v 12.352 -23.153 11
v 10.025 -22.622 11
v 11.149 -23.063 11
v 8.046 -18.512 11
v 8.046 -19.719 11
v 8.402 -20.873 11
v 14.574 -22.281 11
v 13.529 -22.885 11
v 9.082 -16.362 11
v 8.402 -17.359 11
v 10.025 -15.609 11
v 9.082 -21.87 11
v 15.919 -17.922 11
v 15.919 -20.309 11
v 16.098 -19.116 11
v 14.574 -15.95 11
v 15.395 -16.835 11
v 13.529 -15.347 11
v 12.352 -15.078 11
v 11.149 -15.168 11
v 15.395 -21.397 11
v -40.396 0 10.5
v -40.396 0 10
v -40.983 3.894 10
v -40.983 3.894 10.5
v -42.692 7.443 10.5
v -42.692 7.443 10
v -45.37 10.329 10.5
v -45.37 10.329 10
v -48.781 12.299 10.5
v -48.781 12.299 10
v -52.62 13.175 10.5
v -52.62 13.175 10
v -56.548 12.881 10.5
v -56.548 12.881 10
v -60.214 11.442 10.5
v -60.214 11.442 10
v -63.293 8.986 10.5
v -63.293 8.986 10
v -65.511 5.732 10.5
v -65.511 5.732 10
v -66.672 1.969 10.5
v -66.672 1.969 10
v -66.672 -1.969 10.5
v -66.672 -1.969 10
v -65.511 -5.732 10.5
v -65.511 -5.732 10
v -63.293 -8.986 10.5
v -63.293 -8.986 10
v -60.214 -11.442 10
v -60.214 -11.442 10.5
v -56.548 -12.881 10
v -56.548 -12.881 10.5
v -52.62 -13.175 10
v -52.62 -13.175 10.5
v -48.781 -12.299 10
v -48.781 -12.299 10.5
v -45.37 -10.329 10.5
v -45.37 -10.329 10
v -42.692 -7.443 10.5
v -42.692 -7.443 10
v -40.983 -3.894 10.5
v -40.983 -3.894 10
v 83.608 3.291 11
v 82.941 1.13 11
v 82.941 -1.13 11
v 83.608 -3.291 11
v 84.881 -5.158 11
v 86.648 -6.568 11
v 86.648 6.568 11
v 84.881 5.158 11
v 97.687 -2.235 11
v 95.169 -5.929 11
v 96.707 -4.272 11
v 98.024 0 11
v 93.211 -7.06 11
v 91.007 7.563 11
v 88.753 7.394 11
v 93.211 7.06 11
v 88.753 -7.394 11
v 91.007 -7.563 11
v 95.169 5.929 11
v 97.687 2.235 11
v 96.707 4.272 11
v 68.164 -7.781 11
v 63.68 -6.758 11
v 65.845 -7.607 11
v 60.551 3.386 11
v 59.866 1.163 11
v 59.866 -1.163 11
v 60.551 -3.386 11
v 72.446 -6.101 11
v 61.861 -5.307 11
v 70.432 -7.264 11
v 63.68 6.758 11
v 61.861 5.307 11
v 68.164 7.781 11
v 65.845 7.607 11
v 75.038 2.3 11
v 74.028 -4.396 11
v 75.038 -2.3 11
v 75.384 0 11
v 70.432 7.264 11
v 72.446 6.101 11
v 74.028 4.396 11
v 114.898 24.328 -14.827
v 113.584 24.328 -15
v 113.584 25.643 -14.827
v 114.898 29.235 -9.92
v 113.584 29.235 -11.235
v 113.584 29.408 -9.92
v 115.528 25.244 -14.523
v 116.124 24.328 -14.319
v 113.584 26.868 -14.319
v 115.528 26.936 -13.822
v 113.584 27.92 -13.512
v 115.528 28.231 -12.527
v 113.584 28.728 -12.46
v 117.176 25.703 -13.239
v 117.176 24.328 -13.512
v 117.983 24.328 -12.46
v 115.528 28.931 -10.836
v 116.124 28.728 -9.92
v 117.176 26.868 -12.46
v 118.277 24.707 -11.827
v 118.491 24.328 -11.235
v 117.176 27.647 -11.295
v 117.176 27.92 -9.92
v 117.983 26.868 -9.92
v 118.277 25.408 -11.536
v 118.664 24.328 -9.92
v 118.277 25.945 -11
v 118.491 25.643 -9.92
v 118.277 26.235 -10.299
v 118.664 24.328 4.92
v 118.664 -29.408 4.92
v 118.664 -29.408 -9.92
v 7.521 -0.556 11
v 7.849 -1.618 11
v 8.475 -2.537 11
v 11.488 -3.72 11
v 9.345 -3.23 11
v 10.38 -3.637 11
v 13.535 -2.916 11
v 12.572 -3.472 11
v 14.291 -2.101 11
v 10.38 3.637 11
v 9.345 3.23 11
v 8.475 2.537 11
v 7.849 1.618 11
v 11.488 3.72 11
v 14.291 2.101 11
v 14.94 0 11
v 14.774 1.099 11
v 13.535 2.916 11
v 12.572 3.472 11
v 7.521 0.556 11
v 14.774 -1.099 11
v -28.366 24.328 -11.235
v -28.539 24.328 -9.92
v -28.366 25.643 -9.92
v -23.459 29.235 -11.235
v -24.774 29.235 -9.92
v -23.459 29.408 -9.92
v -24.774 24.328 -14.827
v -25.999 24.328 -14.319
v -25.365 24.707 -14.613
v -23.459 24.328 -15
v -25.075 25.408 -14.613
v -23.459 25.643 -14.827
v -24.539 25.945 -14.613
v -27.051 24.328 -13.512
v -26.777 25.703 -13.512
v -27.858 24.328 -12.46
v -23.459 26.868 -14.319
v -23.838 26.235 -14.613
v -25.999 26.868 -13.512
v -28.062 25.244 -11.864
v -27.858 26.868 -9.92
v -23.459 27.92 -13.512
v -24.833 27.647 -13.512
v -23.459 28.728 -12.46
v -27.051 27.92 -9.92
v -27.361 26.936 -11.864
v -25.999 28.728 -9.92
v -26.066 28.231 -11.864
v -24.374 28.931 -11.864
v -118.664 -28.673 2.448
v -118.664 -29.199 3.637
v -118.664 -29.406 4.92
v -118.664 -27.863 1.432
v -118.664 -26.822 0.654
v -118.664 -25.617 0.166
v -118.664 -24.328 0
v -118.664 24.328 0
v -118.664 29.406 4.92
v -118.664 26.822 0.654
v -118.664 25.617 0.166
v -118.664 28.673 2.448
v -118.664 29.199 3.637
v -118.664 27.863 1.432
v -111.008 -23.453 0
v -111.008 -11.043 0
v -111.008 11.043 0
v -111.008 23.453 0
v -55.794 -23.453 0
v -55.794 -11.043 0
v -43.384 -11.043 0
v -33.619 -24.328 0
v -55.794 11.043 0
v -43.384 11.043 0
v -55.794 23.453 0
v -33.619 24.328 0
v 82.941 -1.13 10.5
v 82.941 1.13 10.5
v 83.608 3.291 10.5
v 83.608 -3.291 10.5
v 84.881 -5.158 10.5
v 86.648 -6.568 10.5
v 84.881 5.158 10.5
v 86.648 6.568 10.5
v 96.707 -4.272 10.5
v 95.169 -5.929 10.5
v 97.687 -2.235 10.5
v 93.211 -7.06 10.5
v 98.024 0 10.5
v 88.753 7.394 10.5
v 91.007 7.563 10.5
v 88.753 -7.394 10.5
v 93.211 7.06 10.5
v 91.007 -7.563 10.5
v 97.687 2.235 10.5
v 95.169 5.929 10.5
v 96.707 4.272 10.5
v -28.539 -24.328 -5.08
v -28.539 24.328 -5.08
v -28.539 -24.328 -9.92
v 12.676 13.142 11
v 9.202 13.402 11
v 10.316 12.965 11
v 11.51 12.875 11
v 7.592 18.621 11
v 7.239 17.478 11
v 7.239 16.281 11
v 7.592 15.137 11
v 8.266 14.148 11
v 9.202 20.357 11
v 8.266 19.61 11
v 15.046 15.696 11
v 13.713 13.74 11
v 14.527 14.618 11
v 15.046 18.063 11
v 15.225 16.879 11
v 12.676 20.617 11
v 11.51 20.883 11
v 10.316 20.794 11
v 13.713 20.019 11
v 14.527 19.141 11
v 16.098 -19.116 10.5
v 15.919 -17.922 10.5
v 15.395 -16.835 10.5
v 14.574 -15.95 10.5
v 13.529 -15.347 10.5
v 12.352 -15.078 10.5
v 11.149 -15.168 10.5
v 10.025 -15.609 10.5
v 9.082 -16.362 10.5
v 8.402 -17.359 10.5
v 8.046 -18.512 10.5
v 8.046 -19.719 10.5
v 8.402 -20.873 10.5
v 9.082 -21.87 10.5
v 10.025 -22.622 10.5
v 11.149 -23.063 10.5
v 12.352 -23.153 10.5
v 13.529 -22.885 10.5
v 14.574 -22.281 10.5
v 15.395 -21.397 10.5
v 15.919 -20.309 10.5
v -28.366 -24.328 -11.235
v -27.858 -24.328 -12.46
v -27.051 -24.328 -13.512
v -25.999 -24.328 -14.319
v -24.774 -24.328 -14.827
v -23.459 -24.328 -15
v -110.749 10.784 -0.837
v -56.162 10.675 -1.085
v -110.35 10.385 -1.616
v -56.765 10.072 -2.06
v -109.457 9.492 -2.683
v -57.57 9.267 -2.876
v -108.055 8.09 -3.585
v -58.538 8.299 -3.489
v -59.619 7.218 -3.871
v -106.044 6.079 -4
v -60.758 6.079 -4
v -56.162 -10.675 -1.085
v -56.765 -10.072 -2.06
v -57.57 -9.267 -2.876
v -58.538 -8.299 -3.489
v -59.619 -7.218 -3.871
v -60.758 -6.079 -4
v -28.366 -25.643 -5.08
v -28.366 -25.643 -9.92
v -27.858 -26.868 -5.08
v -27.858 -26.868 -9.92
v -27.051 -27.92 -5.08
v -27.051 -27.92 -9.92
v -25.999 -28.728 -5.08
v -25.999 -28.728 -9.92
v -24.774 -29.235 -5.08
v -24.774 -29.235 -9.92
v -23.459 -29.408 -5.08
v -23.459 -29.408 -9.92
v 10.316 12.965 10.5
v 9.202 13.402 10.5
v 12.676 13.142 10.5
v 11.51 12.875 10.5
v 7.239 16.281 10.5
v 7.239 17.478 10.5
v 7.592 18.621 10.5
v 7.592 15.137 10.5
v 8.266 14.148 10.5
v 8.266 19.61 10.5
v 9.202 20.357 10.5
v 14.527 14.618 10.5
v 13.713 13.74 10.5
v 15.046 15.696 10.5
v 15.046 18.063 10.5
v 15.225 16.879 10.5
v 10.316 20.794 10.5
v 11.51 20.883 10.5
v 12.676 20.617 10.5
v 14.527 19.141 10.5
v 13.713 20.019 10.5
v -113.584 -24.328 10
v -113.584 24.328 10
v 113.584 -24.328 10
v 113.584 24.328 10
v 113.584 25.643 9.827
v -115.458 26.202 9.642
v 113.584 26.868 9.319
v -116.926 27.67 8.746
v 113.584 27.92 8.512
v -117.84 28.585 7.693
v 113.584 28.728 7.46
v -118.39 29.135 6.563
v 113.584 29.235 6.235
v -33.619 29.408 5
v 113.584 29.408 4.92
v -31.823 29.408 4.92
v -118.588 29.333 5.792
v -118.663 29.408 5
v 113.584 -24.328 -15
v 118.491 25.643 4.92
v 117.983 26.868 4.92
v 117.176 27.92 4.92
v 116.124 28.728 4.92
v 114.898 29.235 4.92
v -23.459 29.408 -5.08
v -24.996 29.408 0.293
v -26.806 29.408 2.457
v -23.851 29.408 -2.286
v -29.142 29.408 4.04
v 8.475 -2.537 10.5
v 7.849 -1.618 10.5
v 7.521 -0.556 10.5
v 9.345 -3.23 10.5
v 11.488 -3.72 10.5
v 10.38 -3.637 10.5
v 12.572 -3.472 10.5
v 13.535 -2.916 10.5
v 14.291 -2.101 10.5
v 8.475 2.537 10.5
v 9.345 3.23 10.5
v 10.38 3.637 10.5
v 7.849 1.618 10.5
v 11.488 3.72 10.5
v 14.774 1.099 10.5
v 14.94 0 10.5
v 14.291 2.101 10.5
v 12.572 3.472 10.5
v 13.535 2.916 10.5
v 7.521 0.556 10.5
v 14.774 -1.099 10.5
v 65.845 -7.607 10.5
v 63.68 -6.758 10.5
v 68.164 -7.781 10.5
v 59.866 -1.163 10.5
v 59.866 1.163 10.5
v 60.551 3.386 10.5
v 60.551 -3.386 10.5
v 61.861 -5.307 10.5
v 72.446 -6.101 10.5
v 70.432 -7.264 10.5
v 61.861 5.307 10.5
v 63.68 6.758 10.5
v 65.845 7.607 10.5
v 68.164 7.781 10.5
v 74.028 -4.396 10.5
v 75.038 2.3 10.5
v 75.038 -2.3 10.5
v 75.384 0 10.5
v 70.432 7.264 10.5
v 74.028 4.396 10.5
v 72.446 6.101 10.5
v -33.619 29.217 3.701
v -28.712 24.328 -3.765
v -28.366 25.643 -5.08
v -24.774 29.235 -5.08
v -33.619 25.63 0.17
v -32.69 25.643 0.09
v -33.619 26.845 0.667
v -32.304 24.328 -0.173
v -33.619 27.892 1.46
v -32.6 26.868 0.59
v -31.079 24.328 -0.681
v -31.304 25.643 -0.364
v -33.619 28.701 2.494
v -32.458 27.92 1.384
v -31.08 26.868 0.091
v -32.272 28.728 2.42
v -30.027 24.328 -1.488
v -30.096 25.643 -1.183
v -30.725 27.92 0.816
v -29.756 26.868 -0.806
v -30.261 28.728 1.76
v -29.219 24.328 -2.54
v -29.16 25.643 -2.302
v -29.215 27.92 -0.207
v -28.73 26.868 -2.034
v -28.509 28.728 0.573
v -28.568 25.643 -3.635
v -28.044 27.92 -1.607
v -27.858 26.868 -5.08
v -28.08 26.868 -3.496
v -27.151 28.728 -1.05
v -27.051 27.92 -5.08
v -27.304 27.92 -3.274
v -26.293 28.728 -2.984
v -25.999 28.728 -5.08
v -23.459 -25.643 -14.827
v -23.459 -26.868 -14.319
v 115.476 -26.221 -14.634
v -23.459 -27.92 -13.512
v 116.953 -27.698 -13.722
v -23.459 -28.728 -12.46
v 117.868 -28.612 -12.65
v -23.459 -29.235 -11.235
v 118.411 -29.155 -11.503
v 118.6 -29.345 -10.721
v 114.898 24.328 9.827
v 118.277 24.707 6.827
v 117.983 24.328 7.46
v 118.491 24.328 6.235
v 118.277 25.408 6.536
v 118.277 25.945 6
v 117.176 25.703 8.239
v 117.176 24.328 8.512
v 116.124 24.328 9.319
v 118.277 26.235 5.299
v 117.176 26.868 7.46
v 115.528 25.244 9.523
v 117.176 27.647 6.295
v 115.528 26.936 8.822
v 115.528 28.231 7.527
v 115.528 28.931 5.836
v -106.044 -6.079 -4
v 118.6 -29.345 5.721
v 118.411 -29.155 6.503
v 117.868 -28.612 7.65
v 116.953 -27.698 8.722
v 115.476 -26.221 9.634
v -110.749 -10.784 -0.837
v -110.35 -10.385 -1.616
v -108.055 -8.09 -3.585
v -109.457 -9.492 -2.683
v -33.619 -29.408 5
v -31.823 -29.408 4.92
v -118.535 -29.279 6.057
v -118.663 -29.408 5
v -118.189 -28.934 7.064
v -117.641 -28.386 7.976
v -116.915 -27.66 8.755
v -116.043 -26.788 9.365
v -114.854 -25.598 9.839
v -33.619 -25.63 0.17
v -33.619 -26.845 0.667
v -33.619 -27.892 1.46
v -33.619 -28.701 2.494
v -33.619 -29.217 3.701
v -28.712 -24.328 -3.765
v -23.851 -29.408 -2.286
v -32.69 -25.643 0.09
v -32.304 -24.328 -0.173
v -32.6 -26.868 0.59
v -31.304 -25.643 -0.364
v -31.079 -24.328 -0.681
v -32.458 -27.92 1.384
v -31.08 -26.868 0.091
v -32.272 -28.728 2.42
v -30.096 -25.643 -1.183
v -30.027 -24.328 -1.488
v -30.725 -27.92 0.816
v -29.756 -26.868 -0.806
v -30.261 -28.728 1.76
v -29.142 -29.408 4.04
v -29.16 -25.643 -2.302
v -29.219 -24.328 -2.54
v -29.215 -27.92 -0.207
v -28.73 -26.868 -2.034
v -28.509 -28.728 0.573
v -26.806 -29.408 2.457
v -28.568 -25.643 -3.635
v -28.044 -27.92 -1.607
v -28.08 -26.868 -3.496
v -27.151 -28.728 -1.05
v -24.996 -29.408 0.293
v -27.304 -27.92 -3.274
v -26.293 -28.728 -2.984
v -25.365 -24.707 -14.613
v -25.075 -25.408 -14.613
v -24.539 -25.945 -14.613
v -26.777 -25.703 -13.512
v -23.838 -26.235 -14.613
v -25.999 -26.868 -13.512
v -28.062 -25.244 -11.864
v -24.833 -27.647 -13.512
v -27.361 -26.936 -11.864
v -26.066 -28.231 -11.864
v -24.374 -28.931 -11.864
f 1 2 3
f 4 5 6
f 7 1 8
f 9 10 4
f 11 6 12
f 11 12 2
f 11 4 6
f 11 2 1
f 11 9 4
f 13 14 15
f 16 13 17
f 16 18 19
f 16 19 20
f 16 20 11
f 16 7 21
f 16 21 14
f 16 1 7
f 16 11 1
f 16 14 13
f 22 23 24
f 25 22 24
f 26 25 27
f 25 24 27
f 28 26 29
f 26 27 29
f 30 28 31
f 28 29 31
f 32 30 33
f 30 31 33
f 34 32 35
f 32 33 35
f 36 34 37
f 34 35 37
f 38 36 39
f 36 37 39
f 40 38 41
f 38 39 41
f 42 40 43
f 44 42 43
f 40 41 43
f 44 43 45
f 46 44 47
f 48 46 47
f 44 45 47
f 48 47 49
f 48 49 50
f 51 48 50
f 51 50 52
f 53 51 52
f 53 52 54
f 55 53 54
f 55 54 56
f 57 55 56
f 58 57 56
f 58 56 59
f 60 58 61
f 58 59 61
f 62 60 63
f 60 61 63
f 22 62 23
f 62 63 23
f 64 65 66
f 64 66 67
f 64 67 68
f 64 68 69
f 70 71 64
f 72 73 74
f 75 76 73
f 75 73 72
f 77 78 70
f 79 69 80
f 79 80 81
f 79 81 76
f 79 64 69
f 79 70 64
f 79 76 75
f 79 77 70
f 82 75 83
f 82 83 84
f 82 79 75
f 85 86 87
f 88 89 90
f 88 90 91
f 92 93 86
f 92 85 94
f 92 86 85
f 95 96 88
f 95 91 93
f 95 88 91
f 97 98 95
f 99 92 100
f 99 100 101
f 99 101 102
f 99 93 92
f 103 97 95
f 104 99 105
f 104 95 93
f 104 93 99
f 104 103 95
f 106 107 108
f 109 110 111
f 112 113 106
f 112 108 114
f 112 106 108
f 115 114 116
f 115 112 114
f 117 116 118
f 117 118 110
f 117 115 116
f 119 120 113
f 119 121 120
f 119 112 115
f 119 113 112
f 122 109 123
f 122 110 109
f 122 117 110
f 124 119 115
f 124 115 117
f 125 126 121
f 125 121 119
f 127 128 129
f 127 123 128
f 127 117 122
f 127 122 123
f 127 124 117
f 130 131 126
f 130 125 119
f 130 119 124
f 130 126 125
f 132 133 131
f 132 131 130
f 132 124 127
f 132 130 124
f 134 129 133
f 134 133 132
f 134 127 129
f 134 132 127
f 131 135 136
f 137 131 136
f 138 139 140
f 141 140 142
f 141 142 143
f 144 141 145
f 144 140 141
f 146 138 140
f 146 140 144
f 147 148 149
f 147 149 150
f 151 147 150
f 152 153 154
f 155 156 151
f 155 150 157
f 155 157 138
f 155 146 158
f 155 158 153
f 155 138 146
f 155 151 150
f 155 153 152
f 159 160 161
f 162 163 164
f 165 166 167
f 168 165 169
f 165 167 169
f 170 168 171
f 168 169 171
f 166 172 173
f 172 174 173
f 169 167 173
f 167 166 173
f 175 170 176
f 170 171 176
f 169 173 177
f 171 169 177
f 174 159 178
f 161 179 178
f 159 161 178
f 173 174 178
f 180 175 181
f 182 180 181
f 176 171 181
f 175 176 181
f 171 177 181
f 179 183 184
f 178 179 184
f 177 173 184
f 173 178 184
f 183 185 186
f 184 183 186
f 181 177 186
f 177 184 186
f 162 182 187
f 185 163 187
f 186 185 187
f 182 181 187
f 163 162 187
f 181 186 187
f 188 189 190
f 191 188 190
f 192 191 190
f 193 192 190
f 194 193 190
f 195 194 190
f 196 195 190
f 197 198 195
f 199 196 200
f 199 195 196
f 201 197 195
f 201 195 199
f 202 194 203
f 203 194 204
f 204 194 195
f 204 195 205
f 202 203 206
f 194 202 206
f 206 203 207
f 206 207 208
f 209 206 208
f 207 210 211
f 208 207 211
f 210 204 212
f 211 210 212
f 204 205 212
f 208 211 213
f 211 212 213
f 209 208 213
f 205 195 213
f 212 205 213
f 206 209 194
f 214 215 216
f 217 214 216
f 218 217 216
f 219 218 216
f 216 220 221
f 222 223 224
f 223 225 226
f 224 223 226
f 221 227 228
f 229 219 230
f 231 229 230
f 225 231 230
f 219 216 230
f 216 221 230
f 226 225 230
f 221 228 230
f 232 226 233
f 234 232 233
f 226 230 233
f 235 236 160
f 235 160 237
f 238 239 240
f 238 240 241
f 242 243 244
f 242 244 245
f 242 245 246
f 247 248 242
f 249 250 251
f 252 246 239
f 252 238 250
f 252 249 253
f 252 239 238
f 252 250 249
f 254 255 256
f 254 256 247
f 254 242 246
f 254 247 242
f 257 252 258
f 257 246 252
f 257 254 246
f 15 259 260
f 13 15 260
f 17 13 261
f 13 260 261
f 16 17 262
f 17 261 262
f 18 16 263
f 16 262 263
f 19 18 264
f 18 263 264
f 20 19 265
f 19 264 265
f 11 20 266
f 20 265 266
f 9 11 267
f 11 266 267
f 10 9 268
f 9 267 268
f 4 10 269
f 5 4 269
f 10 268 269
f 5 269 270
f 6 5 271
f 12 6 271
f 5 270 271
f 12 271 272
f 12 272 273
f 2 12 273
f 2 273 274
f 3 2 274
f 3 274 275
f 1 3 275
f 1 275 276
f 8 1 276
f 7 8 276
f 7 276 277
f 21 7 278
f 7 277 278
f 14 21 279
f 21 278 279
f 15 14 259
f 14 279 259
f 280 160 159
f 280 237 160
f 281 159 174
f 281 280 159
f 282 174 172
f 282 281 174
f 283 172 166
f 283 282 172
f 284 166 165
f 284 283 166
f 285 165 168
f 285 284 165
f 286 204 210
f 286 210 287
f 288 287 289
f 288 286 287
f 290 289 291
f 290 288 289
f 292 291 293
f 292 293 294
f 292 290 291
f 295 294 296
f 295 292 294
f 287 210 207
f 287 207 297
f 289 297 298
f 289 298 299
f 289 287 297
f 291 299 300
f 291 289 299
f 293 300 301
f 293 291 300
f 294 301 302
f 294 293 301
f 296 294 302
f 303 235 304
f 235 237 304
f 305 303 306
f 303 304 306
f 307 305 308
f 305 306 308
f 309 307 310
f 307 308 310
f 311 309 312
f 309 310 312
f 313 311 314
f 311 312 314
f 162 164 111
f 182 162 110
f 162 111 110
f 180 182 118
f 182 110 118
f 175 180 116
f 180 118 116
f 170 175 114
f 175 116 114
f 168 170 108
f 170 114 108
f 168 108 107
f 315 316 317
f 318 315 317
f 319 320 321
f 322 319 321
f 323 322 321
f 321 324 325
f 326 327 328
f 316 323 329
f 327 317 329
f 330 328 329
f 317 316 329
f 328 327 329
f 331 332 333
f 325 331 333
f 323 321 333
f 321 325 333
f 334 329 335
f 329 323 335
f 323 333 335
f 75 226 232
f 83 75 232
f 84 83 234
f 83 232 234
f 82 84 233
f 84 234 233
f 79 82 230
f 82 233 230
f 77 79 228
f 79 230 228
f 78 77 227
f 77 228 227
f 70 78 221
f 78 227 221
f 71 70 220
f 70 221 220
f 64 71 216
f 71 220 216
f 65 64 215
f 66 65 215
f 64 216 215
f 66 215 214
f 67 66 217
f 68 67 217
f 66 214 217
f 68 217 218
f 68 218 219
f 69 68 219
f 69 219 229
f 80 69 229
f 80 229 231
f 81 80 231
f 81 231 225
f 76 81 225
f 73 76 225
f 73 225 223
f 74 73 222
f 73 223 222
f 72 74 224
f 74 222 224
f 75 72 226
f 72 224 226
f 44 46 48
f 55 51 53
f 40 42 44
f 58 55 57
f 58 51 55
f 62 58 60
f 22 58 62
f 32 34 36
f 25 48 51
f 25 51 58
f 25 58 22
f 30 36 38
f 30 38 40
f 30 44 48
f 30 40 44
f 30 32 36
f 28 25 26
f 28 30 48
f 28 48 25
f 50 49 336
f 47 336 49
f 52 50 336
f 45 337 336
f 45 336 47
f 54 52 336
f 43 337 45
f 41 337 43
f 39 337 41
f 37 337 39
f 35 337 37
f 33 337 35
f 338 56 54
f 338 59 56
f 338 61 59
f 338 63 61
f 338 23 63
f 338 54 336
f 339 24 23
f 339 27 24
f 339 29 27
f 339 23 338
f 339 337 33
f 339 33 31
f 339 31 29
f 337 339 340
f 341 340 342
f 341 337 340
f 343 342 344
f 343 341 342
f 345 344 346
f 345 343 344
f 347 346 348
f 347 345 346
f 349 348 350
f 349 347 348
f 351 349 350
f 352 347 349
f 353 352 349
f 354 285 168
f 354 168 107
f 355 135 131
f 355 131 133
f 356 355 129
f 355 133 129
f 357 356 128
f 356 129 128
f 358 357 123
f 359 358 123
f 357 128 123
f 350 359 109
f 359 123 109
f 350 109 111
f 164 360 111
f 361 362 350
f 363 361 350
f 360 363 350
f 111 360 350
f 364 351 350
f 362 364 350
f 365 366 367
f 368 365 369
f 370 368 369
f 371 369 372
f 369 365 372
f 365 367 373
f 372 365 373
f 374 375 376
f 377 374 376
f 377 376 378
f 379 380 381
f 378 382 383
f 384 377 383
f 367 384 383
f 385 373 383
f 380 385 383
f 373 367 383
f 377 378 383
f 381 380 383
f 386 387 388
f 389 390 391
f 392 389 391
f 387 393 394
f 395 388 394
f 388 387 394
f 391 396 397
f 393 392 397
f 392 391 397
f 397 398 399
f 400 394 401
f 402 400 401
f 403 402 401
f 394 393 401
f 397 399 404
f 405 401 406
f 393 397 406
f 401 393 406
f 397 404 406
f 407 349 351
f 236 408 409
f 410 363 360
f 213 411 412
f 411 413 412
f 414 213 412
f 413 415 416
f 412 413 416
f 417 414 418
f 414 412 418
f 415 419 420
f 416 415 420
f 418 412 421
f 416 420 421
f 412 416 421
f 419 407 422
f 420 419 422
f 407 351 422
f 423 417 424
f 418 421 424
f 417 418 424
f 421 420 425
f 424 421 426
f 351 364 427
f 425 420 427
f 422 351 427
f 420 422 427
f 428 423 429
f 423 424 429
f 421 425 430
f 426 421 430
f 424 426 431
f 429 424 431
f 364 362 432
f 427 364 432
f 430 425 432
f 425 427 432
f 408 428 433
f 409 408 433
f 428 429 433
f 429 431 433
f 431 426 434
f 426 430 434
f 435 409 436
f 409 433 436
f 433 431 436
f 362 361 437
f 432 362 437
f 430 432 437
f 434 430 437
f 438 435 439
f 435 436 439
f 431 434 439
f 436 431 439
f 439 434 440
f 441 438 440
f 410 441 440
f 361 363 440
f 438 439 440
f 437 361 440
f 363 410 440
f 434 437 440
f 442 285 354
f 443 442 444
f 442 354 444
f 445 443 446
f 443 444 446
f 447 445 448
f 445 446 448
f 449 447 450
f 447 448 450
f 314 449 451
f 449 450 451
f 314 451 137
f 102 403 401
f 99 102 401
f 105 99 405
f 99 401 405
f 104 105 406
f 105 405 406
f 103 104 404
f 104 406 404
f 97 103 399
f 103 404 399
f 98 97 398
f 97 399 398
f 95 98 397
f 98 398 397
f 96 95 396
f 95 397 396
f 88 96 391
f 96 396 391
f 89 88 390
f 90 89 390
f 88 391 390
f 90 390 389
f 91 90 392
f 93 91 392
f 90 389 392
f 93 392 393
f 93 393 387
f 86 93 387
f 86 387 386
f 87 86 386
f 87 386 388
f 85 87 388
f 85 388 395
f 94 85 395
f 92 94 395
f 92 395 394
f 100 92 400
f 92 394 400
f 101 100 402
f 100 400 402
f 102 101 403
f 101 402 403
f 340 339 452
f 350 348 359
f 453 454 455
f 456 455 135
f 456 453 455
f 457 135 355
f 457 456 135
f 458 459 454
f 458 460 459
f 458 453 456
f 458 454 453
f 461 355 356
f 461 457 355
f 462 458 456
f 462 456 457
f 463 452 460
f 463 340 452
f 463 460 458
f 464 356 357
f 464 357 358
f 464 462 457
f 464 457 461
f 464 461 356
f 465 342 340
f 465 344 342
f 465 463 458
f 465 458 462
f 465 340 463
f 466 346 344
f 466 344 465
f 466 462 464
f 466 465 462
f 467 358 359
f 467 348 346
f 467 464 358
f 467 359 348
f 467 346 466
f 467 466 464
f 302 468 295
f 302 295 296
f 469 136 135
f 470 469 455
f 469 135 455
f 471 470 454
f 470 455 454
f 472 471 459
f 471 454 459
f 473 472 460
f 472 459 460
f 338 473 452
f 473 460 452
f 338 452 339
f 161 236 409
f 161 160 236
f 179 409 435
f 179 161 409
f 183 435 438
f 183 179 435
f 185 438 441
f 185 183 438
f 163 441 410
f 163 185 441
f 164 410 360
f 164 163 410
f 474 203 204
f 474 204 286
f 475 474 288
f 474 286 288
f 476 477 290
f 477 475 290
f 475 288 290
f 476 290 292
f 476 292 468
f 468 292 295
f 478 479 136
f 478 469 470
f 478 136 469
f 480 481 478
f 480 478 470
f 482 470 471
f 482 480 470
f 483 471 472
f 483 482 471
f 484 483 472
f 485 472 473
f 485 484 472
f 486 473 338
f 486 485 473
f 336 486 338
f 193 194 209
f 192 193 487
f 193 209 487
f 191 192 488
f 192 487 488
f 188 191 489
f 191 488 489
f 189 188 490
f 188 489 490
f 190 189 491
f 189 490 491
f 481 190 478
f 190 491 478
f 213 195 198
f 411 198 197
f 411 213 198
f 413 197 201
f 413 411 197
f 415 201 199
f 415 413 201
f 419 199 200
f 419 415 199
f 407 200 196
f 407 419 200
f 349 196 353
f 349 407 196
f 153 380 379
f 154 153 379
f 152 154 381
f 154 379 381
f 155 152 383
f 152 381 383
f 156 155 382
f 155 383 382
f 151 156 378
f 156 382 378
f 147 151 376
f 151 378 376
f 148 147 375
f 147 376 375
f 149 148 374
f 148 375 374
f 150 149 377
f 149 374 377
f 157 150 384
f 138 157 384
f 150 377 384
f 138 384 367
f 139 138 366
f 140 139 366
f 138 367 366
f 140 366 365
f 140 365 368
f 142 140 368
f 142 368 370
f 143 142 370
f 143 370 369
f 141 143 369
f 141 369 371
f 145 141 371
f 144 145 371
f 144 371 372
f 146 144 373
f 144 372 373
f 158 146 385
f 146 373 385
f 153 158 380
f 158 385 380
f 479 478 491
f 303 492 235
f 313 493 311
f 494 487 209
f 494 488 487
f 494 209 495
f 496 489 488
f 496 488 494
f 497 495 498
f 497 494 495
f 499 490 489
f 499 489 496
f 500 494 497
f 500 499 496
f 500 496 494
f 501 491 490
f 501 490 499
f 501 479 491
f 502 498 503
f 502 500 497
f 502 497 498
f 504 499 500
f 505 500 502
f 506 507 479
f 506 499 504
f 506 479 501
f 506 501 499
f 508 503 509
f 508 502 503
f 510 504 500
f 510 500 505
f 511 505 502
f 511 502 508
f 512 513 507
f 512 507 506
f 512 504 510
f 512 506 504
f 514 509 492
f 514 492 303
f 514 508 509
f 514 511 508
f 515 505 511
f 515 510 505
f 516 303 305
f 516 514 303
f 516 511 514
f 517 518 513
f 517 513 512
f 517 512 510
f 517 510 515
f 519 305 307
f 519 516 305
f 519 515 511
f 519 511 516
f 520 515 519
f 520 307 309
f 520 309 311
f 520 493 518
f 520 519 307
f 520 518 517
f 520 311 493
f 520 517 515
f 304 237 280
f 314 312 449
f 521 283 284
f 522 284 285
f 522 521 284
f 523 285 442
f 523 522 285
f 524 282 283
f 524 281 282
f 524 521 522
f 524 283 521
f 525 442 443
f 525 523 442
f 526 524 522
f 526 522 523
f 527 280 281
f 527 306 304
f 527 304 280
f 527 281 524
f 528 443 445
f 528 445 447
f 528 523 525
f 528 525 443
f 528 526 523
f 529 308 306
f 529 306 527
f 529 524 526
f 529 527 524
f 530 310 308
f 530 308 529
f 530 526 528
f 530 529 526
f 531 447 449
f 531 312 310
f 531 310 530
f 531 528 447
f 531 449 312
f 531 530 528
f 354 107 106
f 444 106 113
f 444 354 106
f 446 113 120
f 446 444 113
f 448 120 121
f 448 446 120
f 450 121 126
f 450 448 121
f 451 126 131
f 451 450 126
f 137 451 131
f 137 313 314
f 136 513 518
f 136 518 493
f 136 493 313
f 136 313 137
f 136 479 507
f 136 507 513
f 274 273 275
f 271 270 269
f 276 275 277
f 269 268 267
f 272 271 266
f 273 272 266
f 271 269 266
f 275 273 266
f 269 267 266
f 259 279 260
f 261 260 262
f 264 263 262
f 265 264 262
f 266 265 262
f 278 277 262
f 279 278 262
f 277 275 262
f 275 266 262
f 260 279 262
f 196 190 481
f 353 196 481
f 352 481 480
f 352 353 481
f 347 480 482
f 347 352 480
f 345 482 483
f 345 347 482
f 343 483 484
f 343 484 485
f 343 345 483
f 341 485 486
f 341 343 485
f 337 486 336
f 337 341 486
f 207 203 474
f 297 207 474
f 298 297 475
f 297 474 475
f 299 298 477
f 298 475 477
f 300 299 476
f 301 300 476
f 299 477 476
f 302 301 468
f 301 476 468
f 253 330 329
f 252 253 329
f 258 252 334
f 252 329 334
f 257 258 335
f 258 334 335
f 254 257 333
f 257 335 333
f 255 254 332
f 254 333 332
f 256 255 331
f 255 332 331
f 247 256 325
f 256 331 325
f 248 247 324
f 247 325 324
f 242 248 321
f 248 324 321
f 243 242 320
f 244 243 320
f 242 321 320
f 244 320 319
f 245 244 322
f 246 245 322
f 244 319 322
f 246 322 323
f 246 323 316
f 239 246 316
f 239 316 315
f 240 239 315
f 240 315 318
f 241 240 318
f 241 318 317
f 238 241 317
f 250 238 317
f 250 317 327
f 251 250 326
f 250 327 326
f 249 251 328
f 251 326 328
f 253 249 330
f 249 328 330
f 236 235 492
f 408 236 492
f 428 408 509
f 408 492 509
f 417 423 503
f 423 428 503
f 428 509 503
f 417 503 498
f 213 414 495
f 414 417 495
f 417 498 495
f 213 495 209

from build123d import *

# Parameters (mm, degrees)
F0_W          = 237.3272180557
F0_H          = 58.8164292276
F1_DEPTH      = 10
F2_W          = 147.2023129463
F2_H          = 58.8164292276
F3_DEPTH      = 15
F4_F1_R       = 5.08
F4_F2_R       = 5.08
F5_W          = 55.2143082023
F5_H          = 22.0865048468
F6_DEPTH      = 4
F7_T1_DEPTH   = 46.9058521388
F7_T3_DEPTH   = 80.0336554942
F9_R          = 13.2118644906
F10_DEPTH     = 0.5
F12_R         = 4.0488978151
F13_DEPTH     = 0.5
F12_R_2       = 3.7300649458
F12_R_3       = 4.0152102199
F12_R_4       = 7.8029945449
F12_R_5       = 7.5839402098
F14_T1_DEPTH  = 262.7272180557
F15_T1_DEPTH  = 66.4364292276
F15_T3_DEPTH  = 262.7272180557
F15_T5_DEPTH  = 14.84
F15_S9_W      = 5.08
F15_S9_H      = 5.08
F15_T10_DEPTH = 5.08
F15_T14_ANGLE = 89.9999999979
F16_T1_DEPTH  = 74.0564292276


# Not quite as in the source:
# - a fillet or chamfer that OpenCascade refuses, or shapes differently, is made with other operations: its cross-section is extruded or revolved along the edge and cut away or added


with BuildPart() as f1:
    # F0 (on Top) → F1 (new body)
    with BuildSketch(Plane.XY):
        Rectangle(F0_W, F0_H)
    extrude(amount=F1_DEPTH)

    # F2 (on face) → F3 (join)
    with BuildSketch(Plane(origin=(0, 0, 0), x_dir=(1, 0, 0), z_dir=(0, 0, -1))):
        with Locations((45.0624525547, 0)):
            Rectangle(F2_W, F2_H)
    extrude(amount=F3_DEPTH)

    # F4: fillet of radius 5.08 on 7 edges, made by hand

    # F4_f1
    f4_f1_edges = [f1.edges().sort_by_distance(p)[0] for p in [
        (-28.5387039185, 0, 0),
    ]]
    fillet(f4_f1_edges, radius=F4_F1_R)

    # F4_f2
    f4_f2_edges = [f1.edges().sort_by_distance(p)[0] for p in [
        (-28.5387039185, -29.4082146138, -10.04),
        (-28.5387039185, 29.4082146138, -10.04),
        (-28.5387039185, 0, -15),
        (45.0624525547, 29.4082146138, -15),
        (118.6636090279, 0, -15),
        (45.0624525547, -29.4082146138, -15),
        (-30.02660147, 29.4082146138, -1.4878975516),
        (-30.02660147, -29.4082146138, -1.4878975516),
    ]]
    fillet(f4_f2_edges, radius=F4_F2_R)

    # F5 (on face) → F6 (join)
    with BuildSketch(Plane(origin=(0, 0, 0), x_dir=(1, 0, 0), z_dir=(0, 0, -1))):
        with Locations((-83.400927484, 0)):
            Rectangle(F5_W, F5_H)
    extrude(amount=F6_DEPTH)

    # F7: fillet of radius 5.08 on 4 edges, made by hand

    # F7_s2 → F7_t1 (cut)
    with BuildSketch(Plane.XZ.offset(-23.4529260694)):
        with BuildLine():
            ThreePointArc((-55.7937733829, 0), (-57.5701673512, -2.8755530587), (-60.7576428413, -4))
            Line((-60.7576428413, -4), (-55.7937733829, -4))
            Line((-55.7937733829, -4), (-55.7937733829, 0))
        make_face()
        with BuildLine():
            ThreePointArc((-111.0080815852, 0), (-109.2316876169, -2.8755530587), (-106.0442121268, -4))
            Line((-106.0442121268, -4), (-111.0080815852, -4))
            Line((-111.0080815852, -4), (-111.0080815852, 0))
        make_face()
    extrude(amount=F7_T1_DEPTH, mode=Mode.SUBTRACT)

    # F7_s4 → F7_t3 (cut)
    with BuildSketch(Plane.YZ.offset(-123.4177552312)):
        with BuildLine():
            ThreePointArc((-11.0432524234, 0), (-9.2668584551, -2.8755530587), (-6.079382965, -4))
            Line((-6.079382965, -4), (-11.0432524234, -4))
            Line((-11.0432524234, -4), (-11.0432524234, 0))
        make_face()
        with BuildLine():
            ThreePointArc((11.0432524234, 0), (9.2668584551, -2.8755530587), (6.079382965, -4))
            Line((6.079382965, -4), (11.0432524234, -4))
            Line((11.0432524234, -4), (11.0432524234, 0))
        make_face()
    extrude(amount=F7_T3_DEPTH, mode=Mode.SUBTRACT)

    # F9 (on face) → F10 (join)
    with BuildSketch(Plane.XY.offset(10)):
        with Locations((-53.6077320576, 0)):
            Circle(F9_R)
    extrude(amount=F10_DEPTH)

    # F14: fillet of radius 5.08 on 1 edges, made by hand

    # F14_s2 → F14_t1 (cut)
    with BuildSketch(Plane.YZ.offset(-131.3636090279)):
        with BuildLine():
            ThreePointArc((24.3282146138, 10), (27.9203170622, 8.5121024484), (29.4082146138, 4.92))
            Line((29.4082146138, 4.92), (29.4082146138, 10))
            Line((29.4082146138, 10), (24.3282146138, 10))
        make_face()
    extrude(amount=F14_T1_DEPTH, mode=Mode.SUBTRACT)

    # F15: fillet of radius 5.08 on 2 edges, made by hand

    # F15_s2 → F15_t1 (cut)
    with BuildSketch(Plane.XZ.offset(-24.3282146138)):
        with BuildLine():
            ThreePointArc((118.6636090279, 4.92), (117.1757114763, 8.5121024484), (113.5836090279, 10))
            Line((113.5836090279, 10), (118.6636090279, 10))
            Line((118.6636090279, 10), (118.6636090279, 4.92))
        make_face()
    extrude(amount=F15_T1_DEPTH, mode=Mode.SUBTRACT)

    # F15_s4 → F15_t3 (cut)
    with BuildSketch(Plane.YZ.offset(-131.3636090279)):
        with BuildLine():
            ThreePointArc((-29.4082146138, 4.92), (-27.9203170622, 8.5121024484), (-24.3282146138, 10))
            Line((-24.3282146138, 10), (-29.4082146138, 10))
            Line((-29.4082146138, 10), (-29.4082146138, 4.92))
        make_face()
    extrude(amount=F15_T3_DEPTH, mode=Mode.SUBTRACT)

    # F15_s6 → F15_t5 (cut)
    with BuildSketch(Plane.XY.offset(-9.92)):
        with BuildLine():
            ThreePointArc((118.6636090279, 24.3282146138), (117.1757114763, 27.9203170622), (113.5836090279, 29.4082146138))
            Line((113.5836090279, 29.4082146138), (118.6636090279, 29.4082146138))
            Line((118.6636090279, 29.4082146138), (118.6636090279, 24.3282146138))
        make_face()
    extrude(amount=F15_T5_DEPTH, mode=Mode.SUBTRACT)


with BuildPart() as f13:
    # F12 (on face) → F13 (new body)
    with BuildSketch(Plane.XY.offset(10.5)):
        with Locations((12.0495855808, -19.1157609224)):
            Circle(F12_R)
    extrude(amount=F13_DEPTH)


with BuildPart() as f13b:
    # F12 (on face) → F13, piece 2 (new body)
    with BuildSketch(Plane.XY.offset(10.5)):
        with Locations((11.2095503137, 0)):
            Circle(F12_R_2)
    extrude(amount=F13_DEPTH)


with BuildPart() as f13c:
    # F12 (on face) → F13, piece 3 (new body)
    with BuildSketch(Plane.XY.offset(10.5)):
        with Locations((11.2095503137, 16.8793648481)):
            Circle(F12_R_3)
    extrude(amount=F13_DEPTH)


with BuildPart() as f13d:
    # F12 (on face) → F13, piece 4 (new body)
    with BuildSketch(Plane.XY.offset(10.5)):
        with Locations((67.5813481212, 0)):
            Circle(F12_R_4)
    extrude(amount=F13_DEPTH)


with BuildPart() as f13e:
    # F12 (on face) → F13, piece 5 (new body)
    with BuildSketch(Plane.XY.offset(10.5)):
        with Locations((90.4404297471, 0)):
            Circle(F12_R_5)
    extrude(amount=F13_DEPTH)


with BuildPart() as f15_tool8:
    # F15_s9 → F15_t10 (new body)
    with BuildSketch(Plane.YZ.offset(113.5836090279)):
        with Locations((26.8682146138, -12.46)):
            Rectangle(F15_S9_W, F15_S9_H)
    extrude(amount=F15_T10_DEPTH)

    # F15_s11 → F15_t12 (revolve, cut)
    with BuildSketch(Plane(origin=(113.5836090279, 24.3282146138, -9.92), x_dir=(0, -0.7071067812, 0.7071067812), z_dir=(0, 0.7071067812, 0.7071067812))):
        with BuildLine():
            ThreePointArc((0, -5.08), (5.08, 0), (0, 5.08))
            Line((0, 5.08), (0, -5.08))
        make_face()
    revolve(axis=Axis((113.5836090279, 24.3282146138, -9.92), (1, 0, 0)), mode=Mode.SUBTRACT)


with BuildPart() as f1_1:
    add(f1.part)

    # F15_t7: cut F15_tool8
    add(f15_tool8.part, mode=Mode.SUBTRACT)

    # F15_s13 → F15_t14 (revolve, cut)
    with BuildSketch(Plane.XZ.offset(-24.3282146137)):
        with BuildLine():
            ThreePointArc((118.6636090279, 4.92), (117.1757114763, 8.5121024484), (113.5836090279, 10))
            Line((113.5836090279, 10), (118.6636090279, 10))
            Line((118.6636090279, 10), (118.6636090279, 4.92))
        make_face()
    revolve(axis=Axis((118.6636090279, 24.3282146137, 4.9199999999), (-1, 0, 0)), revolution_arc=F15_T14_ANGLE, mode=Mode.SUBTRACT)

    # F16: fillet of radius 5.08 on 1 edges, made by hand

    # F16_s2 → F16_t1 (cut)
    with BuildSketch(Plane.XZ.offset(-37.0282146138)):
        with BuildLine():
            ThreePointArc((-118.6636090279, 4.92), (-117.1757114763, 8.5121024484), (-113.5836090279, 10))
            Line((-113.5836090279, 10), (-118.6636090279, 10))
            Line((-118.6636090279, 10), (-118.6636090279, 4.92))
        make_face()
    extrude(amount=F16_T1_DEPTH, mode=Mode.SUBTRACT)


solid = Compound([f13.part, f13b.part, f13c.part, f13d.part, f13e.part, f1_1.part])
